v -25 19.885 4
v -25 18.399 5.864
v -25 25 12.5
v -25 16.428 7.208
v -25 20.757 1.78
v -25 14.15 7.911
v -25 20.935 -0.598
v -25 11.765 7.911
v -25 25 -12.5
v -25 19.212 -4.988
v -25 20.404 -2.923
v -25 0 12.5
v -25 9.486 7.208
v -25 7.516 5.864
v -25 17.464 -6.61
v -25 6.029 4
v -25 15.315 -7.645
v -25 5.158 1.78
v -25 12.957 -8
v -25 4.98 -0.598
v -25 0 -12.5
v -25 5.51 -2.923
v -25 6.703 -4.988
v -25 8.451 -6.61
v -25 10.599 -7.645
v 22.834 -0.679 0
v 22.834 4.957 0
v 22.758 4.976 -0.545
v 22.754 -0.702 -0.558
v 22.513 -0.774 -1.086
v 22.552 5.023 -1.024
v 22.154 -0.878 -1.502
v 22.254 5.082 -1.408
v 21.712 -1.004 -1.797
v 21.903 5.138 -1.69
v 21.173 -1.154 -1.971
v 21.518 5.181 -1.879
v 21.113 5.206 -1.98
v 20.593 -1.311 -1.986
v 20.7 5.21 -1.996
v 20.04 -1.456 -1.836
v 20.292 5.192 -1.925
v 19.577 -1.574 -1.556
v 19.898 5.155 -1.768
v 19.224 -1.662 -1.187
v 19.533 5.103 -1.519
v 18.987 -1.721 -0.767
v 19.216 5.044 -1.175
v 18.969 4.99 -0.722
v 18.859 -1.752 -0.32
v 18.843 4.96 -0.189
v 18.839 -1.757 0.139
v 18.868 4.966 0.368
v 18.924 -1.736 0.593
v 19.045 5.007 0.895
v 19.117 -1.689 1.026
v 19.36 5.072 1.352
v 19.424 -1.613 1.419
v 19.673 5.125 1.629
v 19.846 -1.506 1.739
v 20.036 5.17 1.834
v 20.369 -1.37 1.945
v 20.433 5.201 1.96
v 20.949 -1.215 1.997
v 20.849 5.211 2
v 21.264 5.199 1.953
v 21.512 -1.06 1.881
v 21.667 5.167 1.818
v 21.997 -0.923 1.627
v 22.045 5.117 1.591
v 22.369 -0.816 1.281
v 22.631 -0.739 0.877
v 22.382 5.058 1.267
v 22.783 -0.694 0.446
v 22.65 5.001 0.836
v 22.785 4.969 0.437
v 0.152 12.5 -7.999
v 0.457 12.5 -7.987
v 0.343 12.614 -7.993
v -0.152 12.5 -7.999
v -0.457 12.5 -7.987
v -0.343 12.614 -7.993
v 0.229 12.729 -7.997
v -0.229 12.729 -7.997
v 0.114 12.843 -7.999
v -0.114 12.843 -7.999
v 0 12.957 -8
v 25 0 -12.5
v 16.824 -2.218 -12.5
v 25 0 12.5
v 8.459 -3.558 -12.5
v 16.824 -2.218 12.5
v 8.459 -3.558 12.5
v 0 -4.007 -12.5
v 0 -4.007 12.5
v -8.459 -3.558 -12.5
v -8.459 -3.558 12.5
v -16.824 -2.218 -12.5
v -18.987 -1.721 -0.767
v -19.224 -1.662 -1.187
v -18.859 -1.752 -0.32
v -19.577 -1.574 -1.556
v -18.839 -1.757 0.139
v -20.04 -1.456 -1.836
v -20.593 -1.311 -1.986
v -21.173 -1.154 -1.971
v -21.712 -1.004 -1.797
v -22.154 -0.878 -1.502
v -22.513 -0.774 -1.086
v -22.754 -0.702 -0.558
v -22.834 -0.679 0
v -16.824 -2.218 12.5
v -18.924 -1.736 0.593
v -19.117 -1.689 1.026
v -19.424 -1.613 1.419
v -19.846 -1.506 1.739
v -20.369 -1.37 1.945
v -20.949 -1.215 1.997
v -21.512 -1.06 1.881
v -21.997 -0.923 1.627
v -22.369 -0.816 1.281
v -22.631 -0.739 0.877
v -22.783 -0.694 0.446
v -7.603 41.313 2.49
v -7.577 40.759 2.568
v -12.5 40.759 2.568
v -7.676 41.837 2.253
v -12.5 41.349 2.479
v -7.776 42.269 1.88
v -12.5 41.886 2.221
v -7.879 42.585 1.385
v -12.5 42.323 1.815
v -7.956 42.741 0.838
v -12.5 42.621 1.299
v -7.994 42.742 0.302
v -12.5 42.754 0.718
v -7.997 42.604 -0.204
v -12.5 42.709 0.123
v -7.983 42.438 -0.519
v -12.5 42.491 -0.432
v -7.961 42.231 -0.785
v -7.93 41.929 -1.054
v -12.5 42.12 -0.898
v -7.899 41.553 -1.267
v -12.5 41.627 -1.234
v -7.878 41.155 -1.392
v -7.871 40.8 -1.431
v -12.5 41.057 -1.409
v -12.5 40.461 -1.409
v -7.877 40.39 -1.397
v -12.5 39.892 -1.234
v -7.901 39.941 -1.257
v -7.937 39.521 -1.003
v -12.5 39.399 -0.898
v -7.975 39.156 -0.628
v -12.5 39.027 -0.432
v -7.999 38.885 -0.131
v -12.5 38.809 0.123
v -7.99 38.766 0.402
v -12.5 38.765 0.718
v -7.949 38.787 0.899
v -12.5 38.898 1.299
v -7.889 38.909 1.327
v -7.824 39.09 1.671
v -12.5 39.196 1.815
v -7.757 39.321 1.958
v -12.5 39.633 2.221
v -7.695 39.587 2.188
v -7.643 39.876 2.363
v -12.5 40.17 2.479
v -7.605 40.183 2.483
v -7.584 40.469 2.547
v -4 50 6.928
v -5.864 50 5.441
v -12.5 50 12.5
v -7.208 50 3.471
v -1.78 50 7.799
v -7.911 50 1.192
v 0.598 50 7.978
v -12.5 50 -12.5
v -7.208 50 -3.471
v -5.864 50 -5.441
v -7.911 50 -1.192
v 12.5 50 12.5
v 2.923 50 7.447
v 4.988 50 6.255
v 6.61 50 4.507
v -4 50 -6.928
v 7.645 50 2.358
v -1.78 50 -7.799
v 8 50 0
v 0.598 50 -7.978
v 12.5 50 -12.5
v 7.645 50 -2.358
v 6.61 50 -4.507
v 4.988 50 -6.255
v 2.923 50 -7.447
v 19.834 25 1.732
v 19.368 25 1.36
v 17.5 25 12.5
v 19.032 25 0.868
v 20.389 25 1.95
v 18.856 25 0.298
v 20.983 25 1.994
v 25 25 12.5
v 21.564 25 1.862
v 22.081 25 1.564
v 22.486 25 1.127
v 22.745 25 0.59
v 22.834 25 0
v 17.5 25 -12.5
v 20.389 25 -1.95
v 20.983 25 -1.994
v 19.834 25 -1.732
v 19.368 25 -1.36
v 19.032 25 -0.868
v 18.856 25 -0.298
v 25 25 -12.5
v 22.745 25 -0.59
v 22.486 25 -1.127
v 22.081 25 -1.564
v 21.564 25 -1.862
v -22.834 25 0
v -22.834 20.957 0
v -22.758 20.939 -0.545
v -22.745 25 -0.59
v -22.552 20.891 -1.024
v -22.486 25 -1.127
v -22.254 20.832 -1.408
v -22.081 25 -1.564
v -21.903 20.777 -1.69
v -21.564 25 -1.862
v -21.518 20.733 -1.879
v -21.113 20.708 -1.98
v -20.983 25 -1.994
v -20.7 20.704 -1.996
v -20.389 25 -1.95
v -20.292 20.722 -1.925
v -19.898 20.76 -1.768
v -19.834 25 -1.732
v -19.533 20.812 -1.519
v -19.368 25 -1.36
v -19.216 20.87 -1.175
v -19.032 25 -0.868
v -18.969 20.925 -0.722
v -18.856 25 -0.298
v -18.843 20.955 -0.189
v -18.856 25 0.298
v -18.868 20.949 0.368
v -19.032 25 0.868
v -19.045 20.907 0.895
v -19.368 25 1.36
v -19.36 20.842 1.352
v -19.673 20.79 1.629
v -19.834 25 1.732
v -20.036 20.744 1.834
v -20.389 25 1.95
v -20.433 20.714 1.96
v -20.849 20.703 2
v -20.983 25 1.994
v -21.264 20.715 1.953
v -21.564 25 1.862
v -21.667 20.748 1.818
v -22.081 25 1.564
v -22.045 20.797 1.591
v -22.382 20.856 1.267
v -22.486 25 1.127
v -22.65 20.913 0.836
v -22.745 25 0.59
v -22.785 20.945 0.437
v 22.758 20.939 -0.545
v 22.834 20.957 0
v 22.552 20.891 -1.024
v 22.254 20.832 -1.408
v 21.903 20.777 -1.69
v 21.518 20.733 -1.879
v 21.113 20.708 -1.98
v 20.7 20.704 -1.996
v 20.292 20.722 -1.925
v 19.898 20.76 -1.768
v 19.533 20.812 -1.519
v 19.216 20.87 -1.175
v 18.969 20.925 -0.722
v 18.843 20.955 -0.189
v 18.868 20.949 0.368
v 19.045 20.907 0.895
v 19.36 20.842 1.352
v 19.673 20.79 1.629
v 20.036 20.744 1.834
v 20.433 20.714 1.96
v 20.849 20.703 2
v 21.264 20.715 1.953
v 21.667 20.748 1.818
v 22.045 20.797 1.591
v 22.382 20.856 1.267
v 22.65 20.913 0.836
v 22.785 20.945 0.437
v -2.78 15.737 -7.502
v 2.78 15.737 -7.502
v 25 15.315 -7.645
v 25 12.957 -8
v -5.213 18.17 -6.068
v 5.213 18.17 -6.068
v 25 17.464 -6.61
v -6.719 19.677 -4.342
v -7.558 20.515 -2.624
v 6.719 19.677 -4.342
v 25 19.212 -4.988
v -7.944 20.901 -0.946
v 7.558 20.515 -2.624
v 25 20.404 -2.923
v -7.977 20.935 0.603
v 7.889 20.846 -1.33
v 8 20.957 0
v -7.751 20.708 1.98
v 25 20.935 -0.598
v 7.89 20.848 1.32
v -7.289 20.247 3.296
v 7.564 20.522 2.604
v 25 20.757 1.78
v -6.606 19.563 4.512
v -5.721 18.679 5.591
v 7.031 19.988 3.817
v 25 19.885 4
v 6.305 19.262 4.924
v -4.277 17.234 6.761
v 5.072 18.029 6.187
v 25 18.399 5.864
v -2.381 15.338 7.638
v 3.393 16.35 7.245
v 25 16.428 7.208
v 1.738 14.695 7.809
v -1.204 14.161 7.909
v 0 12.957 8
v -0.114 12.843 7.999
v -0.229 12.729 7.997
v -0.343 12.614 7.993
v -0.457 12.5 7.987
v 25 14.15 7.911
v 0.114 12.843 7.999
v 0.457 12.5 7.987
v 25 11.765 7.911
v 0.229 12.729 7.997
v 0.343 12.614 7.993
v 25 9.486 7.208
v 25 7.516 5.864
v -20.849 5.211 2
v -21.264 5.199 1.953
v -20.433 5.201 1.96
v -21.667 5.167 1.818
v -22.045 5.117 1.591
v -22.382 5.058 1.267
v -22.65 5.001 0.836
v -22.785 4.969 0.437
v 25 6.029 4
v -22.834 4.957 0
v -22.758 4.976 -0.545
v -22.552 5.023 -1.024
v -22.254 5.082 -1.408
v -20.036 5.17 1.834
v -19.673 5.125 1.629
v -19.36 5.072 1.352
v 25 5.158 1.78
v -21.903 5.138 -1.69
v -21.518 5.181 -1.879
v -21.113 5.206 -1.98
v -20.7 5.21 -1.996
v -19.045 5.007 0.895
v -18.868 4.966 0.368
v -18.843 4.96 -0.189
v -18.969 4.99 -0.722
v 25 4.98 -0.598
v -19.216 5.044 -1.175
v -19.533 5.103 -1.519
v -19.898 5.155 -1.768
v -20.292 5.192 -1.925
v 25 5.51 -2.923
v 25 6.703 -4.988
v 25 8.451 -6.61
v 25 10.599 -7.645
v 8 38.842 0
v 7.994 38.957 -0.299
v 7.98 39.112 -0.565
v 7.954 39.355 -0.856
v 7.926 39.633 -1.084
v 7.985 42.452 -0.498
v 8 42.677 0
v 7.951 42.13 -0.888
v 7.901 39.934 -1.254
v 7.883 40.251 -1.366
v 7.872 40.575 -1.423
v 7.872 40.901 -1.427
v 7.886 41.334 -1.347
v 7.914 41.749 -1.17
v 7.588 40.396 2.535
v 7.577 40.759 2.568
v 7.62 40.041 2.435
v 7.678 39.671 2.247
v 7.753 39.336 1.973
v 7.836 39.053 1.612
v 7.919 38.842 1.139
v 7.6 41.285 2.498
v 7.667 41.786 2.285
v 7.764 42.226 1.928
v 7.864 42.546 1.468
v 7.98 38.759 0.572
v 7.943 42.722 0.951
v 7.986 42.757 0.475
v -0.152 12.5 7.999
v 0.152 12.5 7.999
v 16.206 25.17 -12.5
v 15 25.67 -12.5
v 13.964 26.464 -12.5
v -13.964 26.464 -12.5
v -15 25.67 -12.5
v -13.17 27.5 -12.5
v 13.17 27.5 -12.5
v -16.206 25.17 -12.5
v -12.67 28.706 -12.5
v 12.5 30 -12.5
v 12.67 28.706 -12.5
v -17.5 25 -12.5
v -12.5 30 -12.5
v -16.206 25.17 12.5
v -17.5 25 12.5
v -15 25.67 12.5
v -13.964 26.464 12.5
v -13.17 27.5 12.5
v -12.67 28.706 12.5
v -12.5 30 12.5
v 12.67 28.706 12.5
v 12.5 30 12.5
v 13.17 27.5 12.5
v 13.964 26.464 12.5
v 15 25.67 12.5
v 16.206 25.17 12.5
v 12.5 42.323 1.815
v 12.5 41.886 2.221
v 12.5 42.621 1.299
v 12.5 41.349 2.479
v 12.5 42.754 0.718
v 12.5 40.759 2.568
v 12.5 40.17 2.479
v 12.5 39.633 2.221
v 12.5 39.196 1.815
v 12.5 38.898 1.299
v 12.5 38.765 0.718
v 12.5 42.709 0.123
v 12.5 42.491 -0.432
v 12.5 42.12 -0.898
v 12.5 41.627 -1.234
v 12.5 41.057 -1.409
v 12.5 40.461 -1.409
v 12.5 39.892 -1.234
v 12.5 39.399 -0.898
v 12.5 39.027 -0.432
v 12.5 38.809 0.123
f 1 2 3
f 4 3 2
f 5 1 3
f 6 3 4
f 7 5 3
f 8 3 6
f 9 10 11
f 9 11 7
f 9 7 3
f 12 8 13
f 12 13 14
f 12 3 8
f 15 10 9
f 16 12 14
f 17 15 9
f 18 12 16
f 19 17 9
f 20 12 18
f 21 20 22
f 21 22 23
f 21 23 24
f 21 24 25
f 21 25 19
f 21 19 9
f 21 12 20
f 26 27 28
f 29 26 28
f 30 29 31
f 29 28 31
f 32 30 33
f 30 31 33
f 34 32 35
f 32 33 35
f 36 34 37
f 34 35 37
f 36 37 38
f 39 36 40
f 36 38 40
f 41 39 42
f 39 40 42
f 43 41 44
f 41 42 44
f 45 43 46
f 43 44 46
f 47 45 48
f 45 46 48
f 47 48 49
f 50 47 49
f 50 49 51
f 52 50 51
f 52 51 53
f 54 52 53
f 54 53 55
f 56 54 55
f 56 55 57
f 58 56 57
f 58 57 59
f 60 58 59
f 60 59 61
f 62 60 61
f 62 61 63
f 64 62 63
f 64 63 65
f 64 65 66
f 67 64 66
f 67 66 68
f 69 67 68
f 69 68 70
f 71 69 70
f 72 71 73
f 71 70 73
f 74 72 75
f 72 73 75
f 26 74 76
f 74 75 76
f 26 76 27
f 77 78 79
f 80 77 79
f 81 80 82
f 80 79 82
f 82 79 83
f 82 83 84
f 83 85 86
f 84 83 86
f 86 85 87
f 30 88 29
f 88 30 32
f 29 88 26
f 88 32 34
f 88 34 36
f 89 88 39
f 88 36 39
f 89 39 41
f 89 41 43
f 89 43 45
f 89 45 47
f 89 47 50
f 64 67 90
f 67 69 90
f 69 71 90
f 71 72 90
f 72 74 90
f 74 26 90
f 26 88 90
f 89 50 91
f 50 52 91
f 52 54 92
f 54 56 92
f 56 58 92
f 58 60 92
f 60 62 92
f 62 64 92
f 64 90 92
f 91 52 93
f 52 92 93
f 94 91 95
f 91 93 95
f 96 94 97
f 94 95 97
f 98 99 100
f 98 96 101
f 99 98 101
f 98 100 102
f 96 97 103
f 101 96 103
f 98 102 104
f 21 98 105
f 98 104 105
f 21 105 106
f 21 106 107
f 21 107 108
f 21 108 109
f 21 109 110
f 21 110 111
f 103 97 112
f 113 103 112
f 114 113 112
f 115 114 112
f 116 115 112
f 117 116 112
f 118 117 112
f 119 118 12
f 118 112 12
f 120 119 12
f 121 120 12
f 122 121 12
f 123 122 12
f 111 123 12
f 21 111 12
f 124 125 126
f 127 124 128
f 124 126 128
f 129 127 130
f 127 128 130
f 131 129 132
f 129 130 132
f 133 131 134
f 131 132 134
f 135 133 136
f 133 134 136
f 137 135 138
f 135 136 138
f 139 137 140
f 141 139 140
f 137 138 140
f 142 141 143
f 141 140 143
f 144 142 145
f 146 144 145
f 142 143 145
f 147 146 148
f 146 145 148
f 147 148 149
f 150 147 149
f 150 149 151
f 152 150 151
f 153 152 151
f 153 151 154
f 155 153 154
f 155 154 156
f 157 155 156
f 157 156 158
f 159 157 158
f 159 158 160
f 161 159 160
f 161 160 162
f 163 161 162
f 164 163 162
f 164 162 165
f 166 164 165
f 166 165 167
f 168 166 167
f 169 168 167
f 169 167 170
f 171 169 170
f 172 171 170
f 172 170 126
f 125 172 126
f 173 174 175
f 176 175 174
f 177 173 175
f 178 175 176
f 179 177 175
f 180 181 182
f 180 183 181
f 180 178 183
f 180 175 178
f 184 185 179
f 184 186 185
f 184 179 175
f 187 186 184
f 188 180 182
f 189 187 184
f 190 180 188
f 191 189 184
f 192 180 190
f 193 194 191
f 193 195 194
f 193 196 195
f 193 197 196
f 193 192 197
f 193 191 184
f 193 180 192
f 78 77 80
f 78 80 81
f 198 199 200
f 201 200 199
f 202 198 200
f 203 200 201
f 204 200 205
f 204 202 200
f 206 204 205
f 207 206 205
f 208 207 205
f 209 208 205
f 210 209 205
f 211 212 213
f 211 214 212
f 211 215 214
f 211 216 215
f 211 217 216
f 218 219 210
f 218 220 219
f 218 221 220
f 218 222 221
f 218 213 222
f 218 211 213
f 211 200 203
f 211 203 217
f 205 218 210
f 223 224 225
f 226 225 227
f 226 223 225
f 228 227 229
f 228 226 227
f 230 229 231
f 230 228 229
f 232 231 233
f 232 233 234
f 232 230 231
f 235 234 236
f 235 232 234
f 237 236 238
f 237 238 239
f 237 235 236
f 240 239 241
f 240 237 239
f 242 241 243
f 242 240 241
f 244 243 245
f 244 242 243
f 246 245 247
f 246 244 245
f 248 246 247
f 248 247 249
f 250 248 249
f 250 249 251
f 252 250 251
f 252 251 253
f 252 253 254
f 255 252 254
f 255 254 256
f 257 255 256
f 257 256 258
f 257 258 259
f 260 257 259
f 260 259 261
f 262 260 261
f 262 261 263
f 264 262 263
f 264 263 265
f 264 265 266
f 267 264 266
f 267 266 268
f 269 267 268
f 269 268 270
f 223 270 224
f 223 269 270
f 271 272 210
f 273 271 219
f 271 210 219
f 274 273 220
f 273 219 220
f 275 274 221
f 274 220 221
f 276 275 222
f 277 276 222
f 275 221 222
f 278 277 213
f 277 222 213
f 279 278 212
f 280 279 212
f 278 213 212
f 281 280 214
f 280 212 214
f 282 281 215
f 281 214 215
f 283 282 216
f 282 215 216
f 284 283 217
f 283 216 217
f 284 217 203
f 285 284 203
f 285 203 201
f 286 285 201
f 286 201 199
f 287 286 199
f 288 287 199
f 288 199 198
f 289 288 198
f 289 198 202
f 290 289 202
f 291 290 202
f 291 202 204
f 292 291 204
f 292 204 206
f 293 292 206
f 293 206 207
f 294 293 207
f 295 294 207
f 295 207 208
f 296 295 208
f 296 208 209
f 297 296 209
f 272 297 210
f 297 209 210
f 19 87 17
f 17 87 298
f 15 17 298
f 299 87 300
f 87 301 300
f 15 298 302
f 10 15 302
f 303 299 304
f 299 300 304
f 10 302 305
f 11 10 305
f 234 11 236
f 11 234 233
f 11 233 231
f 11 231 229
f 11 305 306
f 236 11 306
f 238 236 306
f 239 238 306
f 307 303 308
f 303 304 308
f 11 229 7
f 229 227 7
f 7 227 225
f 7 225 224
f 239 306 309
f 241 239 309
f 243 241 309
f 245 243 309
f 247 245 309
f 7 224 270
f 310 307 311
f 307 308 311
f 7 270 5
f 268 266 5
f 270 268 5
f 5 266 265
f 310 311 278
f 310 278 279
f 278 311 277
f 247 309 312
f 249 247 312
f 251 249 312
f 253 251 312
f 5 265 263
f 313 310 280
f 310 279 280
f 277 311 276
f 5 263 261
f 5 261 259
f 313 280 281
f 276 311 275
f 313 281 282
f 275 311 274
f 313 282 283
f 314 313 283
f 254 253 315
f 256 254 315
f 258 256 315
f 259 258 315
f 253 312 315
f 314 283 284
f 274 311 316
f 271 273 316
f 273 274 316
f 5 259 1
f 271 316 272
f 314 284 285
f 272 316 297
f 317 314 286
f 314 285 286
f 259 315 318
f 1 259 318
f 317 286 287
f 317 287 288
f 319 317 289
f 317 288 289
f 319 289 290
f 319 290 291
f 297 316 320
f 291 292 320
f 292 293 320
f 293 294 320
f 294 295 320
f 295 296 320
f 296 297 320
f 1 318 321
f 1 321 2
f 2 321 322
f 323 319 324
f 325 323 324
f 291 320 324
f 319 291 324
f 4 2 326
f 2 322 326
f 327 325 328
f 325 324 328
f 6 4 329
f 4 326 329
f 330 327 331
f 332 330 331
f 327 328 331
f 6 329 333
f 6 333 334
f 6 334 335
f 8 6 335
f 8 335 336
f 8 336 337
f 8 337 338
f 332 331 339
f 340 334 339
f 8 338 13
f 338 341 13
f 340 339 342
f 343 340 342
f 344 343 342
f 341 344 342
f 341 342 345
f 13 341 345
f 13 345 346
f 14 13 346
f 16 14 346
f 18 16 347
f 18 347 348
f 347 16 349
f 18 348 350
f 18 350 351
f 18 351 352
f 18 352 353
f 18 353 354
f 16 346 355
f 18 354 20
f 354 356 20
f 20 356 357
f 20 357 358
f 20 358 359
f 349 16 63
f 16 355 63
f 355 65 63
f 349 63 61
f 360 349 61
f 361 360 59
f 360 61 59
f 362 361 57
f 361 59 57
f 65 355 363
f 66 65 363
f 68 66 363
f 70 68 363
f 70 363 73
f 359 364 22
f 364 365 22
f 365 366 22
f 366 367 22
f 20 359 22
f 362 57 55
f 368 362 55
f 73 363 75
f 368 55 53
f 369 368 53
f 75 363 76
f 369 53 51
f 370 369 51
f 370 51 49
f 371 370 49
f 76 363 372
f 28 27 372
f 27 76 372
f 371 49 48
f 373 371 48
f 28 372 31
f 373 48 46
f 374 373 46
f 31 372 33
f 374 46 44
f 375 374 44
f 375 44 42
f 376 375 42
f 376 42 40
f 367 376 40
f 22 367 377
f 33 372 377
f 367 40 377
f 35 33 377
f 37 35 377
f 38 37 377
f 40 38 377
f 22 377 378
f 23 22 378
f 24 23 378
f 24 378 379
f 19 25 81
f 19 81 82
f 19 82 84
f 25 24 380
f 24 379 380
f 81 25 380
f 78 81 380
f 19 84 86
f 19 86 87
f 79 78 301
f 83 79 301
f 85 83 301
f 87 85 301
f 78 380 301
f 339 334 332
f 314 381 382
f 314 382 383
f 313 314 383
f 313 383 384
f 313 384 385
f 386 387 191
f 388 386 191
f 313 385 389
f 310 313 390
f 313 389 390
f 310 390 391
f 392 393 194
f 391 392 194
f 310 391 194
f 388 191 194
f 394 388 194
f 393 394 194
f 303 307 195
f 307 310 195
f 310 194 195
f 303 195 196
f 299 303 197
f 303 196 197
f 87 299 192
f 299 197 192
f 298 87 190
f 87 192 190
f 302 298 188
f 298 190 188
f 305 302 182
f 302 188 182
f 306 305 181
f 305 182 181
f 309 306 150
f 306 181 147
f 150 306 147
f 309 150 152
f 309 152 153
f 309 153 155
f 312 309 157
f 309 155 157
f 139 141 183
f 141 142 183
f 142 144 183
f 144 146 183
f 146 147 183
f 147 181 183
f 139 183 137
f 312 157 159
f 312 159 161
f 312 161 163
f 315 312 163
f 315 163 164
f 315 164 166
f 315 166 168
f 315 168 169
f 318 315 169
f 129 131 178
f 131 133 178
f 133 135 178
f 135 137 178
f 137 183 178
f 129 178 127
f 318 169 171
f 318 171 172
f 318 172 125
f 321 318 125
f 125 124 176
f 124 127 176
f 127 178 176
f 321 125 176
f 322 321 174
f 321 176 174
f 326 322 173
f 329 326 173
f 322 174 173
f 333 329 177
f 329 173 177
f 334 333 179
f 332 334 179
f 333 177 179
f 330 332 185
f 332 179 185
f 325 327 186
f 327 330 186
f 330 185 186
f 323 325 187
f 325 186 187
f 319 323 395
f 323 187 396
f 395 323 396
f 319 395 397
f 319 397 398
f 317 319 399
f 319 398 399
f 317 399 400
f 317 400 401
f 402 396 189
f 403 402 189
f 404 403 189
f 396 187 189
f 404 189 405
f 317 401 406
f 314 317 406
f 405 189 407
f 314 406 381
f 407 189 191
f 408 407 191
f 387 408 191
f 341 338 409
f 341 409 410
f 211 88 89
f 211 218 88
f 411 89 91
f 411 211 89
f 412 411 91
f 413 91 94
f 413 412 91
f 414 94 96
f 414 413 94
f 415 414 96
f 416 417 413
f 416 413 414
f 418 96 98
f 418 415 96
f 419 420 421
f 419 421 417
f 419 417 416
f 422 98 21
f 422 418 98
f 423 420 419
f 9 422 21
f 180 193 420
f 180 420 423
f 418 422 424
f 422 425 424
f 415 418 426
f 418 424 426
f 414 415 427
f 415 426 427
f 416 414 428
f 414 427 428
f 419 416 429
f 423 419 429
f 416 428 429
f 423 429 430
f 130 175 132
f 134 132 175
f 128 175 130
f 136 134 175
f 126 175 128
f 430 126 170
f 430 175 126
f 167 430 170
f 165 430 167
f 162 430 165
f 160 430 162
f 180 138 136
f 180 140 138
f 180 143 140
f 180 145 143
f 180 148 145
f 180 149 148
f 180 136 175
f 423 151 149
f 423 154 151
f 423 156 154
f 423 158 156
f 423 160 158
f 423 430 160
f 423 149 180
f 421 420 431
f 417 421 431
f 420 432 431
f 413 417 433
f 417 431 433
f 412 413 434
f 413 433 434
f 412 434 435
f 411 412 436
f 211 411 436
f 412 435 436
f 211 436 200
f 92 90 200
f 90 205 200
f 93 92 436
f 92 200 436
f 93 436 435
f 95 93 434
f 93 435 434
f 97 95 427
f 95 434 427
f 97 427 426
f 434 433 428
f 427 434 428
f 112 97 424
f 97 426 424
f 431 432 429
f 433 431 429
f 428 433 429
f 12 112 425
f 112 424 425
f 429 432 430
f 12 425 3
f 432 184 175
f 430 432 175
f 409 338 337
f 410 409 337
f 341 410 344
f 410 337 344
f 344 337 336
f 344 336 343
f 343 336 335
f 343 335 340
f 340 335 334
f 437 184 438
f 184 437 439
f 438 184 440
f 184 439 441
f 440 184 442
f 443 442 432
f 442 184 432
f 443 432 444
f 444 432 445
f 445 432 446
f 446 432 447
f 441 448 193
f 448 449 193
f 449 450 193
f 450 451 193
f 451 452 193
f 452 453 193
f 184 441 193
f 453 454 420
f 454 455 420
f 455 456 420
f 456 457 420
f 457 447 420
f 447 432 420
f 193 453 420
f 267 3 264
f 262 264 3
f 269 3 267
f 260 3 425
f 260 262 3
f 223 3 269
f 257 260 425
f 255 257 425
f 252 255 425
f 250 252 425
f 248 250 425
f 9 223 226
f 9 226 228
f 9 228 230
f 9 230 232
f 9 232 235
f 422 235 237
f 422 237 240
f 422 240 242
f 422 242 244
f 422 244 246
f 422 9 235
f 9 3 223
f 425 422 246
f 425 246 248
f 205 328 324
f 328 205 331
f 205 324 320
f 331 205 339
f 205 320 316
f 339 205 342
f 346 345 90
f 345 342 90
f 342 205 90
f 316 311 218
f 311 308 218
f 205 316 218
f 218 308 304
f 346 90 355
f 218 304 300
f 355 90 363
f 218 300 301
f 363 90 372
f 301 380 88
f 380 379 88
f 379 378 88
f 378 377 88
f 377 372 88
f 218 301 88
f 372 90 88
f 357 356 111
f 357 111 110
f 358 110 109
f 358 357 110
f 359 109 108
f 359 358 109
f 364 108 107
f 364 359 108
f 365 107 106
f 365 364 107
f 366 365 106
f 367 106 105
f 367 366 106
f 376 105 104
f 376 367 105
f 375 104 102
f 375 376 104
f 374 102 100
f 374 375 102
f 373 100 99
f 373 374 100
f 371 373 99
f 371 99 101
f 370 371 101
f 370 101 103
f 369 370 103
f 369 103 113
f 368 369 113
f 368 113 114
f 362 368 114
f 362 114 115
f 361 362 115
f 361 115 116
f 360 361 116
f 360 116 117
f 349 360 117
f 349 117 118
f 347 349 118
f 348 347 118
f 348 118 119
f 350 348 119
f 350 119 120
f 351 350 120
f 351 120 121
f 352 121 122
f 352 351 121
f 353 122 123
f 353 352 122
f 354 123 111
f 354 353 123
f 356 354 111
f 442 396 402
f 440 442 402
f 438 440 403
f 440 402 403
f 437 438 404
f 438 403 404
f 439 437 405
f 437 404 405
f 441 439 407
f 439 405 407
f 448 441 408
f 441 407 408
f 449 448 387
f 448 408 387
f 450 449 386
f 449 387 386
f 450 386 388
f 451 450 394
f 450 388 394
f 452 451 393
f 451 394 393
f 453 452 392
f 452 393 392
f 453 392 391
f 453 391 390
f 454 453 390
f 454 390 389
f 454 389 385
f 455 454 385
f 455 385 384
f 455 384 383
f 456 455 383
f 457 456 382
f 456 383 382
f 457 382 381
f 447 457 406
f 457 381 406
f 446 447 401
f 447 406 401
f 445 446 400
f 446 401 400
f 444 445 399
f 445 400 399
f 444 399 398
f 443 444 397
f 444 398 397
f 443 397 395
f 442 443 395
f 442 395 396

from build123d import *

# Parameters (mm, degrees)
CROQUIS2_W                 = 50
CROQUIS2_H                 = 25
SALIENTE_EXTRUIR2_DEPTH    = 25
CROQUIS9_W                 = 25
CROQUIS9_H                 = 25
SALIENTE_EXTRUIR3_DEPTH    = 50
CROQUIS10_R                = 8
CORTAR_EXTRUIR2_DEPTH      = 43
CORTAR_EXTRUIR2_DEPTH_BACK = 49
CROQUIS11_R                = 8
CORTAR_EXTRUIR3_DEPTH      = 37.5
REDONDEO1_R                = 5
SALIENTE_EXTRUIR4_DEPTH    = 12.5
CROQUIS15_R                = 2
CORTAR_EXTRUIR4_DEPTH      = 33
CROQUIS16_R                = 2
CORTAR_EXTRUIR5_DEPTH      = 33


with BuildPart() as part:
    # Croquis2 → Saliente-Extruir2 (new body)
    with BuildSketch(Plane(origin=(0, 0, 0), x_dir=(1, 0, 0), z_dir=(0, 1, 0))):
        Rectangle(CROQUIS2_W, CROQUIS2_H)
    extrude(amount=SALIENTE_EXTRUIR2_DEPTH)

    # Croquis9 → Saliente-Extruir3 (add)
    with BuildSketch(Plane(origin=(0, 0, 0), x_dir=(1, 0, 0), z_dir=(0, 1, 0))):
        Rectangle(CROQUIS9_W, CROQUIS9_H)
    extrude(amount=SALIENTE_EXTRUIR3_DEPTH)

    # Croquis10 → Cortar-Extruir2 (cut, two sides)
    with BuildSketch(Plane(origin=(0, 0, 0), x_dir=(0, 0, -1), z_dir=(1, 0, 0))) as cortar_extruir2_sk:
        with Locations((0, 12.957262023)):
            Circle(CROQUIS10_R)
    extrude(amount=CORTAR_EXTRUIR2_DEPTH, mode=Mode.SUBTRACT)
    extrude(cortar_extruir2_sk.sketch, amount=-CORTAR_EXTRUIR2_DEPTH_BACK, mode=Mode.SUBTRACT)

    # Croquis11 → Cortar-Extruir3 (cut, symmetric)
    with BuildSketch(Plane(origin=(0, 50, 0), x_dir=(1, 0, 0), z_dir=(0, 1, 0))):
        Circle(CROQUIS11_R)
    extrude(amount=CORTAR_EXTRUIR3_DEPTH, both=True, mode=Mode.SUBTRACT)

    # Redondeo1
    redondeo1_edges = [part.edges().sort_by_distance(p)[0] for p in [
        (12.5, 25, 0),
        (-12.5, 25, 0),
    ]]
    fillet(redondeo1_edges, radius=REDONDEO1_R)

    # Croquis13 → Saliente-Extruir4 (add, symmetric)
    with BuildSketch(Plane.XY):
        with BuildLine():
            Line((-25, 0), (25, 0))
            ThreePointArc((25, 0), (0, -4.006579232), (-25, 0))
        make_face()
    extrude(amount=SALIENTE_EXTRUIR4_DEPTH, both=True)

    # Croquis15 → Cortar-Extruir4 (cut)
    with BuildSketch(Plane.ZY.offset(12.5)):
        with Locations((0.568263939, 40.759281312)):
            Circle(CROQUIS15_R)
    extrude(amount=-CORTAR_EXTRUIR4_DEPTH, mode=Mode.SUBTRACT)

    # Croquis16 → Cortar-Extruir5 (cut)
    with BuildSketch(Plane(origin=(0, 25, 0), x_dir=(1, 0, 0), z_dir=(0, 1, 0))):
        with Locations((20.833740283, 0)):
            Circle(CROQUIS16_R)
    cortar_extruir5 = extrude(amount=-CORTAR_EXTRUIR5_DEPTH, mode=Mode.SUBTRACT)

    # Simetría1: Cortar-Extruir5 across plane
    add(cortar_extruir5.mirror(Plane(origin=(0, 0, 0), x_dir=(0, 0, 1), z_dir=(1, 0, 0))), mode=Mode.SUBTRACT)


solid = part.part
